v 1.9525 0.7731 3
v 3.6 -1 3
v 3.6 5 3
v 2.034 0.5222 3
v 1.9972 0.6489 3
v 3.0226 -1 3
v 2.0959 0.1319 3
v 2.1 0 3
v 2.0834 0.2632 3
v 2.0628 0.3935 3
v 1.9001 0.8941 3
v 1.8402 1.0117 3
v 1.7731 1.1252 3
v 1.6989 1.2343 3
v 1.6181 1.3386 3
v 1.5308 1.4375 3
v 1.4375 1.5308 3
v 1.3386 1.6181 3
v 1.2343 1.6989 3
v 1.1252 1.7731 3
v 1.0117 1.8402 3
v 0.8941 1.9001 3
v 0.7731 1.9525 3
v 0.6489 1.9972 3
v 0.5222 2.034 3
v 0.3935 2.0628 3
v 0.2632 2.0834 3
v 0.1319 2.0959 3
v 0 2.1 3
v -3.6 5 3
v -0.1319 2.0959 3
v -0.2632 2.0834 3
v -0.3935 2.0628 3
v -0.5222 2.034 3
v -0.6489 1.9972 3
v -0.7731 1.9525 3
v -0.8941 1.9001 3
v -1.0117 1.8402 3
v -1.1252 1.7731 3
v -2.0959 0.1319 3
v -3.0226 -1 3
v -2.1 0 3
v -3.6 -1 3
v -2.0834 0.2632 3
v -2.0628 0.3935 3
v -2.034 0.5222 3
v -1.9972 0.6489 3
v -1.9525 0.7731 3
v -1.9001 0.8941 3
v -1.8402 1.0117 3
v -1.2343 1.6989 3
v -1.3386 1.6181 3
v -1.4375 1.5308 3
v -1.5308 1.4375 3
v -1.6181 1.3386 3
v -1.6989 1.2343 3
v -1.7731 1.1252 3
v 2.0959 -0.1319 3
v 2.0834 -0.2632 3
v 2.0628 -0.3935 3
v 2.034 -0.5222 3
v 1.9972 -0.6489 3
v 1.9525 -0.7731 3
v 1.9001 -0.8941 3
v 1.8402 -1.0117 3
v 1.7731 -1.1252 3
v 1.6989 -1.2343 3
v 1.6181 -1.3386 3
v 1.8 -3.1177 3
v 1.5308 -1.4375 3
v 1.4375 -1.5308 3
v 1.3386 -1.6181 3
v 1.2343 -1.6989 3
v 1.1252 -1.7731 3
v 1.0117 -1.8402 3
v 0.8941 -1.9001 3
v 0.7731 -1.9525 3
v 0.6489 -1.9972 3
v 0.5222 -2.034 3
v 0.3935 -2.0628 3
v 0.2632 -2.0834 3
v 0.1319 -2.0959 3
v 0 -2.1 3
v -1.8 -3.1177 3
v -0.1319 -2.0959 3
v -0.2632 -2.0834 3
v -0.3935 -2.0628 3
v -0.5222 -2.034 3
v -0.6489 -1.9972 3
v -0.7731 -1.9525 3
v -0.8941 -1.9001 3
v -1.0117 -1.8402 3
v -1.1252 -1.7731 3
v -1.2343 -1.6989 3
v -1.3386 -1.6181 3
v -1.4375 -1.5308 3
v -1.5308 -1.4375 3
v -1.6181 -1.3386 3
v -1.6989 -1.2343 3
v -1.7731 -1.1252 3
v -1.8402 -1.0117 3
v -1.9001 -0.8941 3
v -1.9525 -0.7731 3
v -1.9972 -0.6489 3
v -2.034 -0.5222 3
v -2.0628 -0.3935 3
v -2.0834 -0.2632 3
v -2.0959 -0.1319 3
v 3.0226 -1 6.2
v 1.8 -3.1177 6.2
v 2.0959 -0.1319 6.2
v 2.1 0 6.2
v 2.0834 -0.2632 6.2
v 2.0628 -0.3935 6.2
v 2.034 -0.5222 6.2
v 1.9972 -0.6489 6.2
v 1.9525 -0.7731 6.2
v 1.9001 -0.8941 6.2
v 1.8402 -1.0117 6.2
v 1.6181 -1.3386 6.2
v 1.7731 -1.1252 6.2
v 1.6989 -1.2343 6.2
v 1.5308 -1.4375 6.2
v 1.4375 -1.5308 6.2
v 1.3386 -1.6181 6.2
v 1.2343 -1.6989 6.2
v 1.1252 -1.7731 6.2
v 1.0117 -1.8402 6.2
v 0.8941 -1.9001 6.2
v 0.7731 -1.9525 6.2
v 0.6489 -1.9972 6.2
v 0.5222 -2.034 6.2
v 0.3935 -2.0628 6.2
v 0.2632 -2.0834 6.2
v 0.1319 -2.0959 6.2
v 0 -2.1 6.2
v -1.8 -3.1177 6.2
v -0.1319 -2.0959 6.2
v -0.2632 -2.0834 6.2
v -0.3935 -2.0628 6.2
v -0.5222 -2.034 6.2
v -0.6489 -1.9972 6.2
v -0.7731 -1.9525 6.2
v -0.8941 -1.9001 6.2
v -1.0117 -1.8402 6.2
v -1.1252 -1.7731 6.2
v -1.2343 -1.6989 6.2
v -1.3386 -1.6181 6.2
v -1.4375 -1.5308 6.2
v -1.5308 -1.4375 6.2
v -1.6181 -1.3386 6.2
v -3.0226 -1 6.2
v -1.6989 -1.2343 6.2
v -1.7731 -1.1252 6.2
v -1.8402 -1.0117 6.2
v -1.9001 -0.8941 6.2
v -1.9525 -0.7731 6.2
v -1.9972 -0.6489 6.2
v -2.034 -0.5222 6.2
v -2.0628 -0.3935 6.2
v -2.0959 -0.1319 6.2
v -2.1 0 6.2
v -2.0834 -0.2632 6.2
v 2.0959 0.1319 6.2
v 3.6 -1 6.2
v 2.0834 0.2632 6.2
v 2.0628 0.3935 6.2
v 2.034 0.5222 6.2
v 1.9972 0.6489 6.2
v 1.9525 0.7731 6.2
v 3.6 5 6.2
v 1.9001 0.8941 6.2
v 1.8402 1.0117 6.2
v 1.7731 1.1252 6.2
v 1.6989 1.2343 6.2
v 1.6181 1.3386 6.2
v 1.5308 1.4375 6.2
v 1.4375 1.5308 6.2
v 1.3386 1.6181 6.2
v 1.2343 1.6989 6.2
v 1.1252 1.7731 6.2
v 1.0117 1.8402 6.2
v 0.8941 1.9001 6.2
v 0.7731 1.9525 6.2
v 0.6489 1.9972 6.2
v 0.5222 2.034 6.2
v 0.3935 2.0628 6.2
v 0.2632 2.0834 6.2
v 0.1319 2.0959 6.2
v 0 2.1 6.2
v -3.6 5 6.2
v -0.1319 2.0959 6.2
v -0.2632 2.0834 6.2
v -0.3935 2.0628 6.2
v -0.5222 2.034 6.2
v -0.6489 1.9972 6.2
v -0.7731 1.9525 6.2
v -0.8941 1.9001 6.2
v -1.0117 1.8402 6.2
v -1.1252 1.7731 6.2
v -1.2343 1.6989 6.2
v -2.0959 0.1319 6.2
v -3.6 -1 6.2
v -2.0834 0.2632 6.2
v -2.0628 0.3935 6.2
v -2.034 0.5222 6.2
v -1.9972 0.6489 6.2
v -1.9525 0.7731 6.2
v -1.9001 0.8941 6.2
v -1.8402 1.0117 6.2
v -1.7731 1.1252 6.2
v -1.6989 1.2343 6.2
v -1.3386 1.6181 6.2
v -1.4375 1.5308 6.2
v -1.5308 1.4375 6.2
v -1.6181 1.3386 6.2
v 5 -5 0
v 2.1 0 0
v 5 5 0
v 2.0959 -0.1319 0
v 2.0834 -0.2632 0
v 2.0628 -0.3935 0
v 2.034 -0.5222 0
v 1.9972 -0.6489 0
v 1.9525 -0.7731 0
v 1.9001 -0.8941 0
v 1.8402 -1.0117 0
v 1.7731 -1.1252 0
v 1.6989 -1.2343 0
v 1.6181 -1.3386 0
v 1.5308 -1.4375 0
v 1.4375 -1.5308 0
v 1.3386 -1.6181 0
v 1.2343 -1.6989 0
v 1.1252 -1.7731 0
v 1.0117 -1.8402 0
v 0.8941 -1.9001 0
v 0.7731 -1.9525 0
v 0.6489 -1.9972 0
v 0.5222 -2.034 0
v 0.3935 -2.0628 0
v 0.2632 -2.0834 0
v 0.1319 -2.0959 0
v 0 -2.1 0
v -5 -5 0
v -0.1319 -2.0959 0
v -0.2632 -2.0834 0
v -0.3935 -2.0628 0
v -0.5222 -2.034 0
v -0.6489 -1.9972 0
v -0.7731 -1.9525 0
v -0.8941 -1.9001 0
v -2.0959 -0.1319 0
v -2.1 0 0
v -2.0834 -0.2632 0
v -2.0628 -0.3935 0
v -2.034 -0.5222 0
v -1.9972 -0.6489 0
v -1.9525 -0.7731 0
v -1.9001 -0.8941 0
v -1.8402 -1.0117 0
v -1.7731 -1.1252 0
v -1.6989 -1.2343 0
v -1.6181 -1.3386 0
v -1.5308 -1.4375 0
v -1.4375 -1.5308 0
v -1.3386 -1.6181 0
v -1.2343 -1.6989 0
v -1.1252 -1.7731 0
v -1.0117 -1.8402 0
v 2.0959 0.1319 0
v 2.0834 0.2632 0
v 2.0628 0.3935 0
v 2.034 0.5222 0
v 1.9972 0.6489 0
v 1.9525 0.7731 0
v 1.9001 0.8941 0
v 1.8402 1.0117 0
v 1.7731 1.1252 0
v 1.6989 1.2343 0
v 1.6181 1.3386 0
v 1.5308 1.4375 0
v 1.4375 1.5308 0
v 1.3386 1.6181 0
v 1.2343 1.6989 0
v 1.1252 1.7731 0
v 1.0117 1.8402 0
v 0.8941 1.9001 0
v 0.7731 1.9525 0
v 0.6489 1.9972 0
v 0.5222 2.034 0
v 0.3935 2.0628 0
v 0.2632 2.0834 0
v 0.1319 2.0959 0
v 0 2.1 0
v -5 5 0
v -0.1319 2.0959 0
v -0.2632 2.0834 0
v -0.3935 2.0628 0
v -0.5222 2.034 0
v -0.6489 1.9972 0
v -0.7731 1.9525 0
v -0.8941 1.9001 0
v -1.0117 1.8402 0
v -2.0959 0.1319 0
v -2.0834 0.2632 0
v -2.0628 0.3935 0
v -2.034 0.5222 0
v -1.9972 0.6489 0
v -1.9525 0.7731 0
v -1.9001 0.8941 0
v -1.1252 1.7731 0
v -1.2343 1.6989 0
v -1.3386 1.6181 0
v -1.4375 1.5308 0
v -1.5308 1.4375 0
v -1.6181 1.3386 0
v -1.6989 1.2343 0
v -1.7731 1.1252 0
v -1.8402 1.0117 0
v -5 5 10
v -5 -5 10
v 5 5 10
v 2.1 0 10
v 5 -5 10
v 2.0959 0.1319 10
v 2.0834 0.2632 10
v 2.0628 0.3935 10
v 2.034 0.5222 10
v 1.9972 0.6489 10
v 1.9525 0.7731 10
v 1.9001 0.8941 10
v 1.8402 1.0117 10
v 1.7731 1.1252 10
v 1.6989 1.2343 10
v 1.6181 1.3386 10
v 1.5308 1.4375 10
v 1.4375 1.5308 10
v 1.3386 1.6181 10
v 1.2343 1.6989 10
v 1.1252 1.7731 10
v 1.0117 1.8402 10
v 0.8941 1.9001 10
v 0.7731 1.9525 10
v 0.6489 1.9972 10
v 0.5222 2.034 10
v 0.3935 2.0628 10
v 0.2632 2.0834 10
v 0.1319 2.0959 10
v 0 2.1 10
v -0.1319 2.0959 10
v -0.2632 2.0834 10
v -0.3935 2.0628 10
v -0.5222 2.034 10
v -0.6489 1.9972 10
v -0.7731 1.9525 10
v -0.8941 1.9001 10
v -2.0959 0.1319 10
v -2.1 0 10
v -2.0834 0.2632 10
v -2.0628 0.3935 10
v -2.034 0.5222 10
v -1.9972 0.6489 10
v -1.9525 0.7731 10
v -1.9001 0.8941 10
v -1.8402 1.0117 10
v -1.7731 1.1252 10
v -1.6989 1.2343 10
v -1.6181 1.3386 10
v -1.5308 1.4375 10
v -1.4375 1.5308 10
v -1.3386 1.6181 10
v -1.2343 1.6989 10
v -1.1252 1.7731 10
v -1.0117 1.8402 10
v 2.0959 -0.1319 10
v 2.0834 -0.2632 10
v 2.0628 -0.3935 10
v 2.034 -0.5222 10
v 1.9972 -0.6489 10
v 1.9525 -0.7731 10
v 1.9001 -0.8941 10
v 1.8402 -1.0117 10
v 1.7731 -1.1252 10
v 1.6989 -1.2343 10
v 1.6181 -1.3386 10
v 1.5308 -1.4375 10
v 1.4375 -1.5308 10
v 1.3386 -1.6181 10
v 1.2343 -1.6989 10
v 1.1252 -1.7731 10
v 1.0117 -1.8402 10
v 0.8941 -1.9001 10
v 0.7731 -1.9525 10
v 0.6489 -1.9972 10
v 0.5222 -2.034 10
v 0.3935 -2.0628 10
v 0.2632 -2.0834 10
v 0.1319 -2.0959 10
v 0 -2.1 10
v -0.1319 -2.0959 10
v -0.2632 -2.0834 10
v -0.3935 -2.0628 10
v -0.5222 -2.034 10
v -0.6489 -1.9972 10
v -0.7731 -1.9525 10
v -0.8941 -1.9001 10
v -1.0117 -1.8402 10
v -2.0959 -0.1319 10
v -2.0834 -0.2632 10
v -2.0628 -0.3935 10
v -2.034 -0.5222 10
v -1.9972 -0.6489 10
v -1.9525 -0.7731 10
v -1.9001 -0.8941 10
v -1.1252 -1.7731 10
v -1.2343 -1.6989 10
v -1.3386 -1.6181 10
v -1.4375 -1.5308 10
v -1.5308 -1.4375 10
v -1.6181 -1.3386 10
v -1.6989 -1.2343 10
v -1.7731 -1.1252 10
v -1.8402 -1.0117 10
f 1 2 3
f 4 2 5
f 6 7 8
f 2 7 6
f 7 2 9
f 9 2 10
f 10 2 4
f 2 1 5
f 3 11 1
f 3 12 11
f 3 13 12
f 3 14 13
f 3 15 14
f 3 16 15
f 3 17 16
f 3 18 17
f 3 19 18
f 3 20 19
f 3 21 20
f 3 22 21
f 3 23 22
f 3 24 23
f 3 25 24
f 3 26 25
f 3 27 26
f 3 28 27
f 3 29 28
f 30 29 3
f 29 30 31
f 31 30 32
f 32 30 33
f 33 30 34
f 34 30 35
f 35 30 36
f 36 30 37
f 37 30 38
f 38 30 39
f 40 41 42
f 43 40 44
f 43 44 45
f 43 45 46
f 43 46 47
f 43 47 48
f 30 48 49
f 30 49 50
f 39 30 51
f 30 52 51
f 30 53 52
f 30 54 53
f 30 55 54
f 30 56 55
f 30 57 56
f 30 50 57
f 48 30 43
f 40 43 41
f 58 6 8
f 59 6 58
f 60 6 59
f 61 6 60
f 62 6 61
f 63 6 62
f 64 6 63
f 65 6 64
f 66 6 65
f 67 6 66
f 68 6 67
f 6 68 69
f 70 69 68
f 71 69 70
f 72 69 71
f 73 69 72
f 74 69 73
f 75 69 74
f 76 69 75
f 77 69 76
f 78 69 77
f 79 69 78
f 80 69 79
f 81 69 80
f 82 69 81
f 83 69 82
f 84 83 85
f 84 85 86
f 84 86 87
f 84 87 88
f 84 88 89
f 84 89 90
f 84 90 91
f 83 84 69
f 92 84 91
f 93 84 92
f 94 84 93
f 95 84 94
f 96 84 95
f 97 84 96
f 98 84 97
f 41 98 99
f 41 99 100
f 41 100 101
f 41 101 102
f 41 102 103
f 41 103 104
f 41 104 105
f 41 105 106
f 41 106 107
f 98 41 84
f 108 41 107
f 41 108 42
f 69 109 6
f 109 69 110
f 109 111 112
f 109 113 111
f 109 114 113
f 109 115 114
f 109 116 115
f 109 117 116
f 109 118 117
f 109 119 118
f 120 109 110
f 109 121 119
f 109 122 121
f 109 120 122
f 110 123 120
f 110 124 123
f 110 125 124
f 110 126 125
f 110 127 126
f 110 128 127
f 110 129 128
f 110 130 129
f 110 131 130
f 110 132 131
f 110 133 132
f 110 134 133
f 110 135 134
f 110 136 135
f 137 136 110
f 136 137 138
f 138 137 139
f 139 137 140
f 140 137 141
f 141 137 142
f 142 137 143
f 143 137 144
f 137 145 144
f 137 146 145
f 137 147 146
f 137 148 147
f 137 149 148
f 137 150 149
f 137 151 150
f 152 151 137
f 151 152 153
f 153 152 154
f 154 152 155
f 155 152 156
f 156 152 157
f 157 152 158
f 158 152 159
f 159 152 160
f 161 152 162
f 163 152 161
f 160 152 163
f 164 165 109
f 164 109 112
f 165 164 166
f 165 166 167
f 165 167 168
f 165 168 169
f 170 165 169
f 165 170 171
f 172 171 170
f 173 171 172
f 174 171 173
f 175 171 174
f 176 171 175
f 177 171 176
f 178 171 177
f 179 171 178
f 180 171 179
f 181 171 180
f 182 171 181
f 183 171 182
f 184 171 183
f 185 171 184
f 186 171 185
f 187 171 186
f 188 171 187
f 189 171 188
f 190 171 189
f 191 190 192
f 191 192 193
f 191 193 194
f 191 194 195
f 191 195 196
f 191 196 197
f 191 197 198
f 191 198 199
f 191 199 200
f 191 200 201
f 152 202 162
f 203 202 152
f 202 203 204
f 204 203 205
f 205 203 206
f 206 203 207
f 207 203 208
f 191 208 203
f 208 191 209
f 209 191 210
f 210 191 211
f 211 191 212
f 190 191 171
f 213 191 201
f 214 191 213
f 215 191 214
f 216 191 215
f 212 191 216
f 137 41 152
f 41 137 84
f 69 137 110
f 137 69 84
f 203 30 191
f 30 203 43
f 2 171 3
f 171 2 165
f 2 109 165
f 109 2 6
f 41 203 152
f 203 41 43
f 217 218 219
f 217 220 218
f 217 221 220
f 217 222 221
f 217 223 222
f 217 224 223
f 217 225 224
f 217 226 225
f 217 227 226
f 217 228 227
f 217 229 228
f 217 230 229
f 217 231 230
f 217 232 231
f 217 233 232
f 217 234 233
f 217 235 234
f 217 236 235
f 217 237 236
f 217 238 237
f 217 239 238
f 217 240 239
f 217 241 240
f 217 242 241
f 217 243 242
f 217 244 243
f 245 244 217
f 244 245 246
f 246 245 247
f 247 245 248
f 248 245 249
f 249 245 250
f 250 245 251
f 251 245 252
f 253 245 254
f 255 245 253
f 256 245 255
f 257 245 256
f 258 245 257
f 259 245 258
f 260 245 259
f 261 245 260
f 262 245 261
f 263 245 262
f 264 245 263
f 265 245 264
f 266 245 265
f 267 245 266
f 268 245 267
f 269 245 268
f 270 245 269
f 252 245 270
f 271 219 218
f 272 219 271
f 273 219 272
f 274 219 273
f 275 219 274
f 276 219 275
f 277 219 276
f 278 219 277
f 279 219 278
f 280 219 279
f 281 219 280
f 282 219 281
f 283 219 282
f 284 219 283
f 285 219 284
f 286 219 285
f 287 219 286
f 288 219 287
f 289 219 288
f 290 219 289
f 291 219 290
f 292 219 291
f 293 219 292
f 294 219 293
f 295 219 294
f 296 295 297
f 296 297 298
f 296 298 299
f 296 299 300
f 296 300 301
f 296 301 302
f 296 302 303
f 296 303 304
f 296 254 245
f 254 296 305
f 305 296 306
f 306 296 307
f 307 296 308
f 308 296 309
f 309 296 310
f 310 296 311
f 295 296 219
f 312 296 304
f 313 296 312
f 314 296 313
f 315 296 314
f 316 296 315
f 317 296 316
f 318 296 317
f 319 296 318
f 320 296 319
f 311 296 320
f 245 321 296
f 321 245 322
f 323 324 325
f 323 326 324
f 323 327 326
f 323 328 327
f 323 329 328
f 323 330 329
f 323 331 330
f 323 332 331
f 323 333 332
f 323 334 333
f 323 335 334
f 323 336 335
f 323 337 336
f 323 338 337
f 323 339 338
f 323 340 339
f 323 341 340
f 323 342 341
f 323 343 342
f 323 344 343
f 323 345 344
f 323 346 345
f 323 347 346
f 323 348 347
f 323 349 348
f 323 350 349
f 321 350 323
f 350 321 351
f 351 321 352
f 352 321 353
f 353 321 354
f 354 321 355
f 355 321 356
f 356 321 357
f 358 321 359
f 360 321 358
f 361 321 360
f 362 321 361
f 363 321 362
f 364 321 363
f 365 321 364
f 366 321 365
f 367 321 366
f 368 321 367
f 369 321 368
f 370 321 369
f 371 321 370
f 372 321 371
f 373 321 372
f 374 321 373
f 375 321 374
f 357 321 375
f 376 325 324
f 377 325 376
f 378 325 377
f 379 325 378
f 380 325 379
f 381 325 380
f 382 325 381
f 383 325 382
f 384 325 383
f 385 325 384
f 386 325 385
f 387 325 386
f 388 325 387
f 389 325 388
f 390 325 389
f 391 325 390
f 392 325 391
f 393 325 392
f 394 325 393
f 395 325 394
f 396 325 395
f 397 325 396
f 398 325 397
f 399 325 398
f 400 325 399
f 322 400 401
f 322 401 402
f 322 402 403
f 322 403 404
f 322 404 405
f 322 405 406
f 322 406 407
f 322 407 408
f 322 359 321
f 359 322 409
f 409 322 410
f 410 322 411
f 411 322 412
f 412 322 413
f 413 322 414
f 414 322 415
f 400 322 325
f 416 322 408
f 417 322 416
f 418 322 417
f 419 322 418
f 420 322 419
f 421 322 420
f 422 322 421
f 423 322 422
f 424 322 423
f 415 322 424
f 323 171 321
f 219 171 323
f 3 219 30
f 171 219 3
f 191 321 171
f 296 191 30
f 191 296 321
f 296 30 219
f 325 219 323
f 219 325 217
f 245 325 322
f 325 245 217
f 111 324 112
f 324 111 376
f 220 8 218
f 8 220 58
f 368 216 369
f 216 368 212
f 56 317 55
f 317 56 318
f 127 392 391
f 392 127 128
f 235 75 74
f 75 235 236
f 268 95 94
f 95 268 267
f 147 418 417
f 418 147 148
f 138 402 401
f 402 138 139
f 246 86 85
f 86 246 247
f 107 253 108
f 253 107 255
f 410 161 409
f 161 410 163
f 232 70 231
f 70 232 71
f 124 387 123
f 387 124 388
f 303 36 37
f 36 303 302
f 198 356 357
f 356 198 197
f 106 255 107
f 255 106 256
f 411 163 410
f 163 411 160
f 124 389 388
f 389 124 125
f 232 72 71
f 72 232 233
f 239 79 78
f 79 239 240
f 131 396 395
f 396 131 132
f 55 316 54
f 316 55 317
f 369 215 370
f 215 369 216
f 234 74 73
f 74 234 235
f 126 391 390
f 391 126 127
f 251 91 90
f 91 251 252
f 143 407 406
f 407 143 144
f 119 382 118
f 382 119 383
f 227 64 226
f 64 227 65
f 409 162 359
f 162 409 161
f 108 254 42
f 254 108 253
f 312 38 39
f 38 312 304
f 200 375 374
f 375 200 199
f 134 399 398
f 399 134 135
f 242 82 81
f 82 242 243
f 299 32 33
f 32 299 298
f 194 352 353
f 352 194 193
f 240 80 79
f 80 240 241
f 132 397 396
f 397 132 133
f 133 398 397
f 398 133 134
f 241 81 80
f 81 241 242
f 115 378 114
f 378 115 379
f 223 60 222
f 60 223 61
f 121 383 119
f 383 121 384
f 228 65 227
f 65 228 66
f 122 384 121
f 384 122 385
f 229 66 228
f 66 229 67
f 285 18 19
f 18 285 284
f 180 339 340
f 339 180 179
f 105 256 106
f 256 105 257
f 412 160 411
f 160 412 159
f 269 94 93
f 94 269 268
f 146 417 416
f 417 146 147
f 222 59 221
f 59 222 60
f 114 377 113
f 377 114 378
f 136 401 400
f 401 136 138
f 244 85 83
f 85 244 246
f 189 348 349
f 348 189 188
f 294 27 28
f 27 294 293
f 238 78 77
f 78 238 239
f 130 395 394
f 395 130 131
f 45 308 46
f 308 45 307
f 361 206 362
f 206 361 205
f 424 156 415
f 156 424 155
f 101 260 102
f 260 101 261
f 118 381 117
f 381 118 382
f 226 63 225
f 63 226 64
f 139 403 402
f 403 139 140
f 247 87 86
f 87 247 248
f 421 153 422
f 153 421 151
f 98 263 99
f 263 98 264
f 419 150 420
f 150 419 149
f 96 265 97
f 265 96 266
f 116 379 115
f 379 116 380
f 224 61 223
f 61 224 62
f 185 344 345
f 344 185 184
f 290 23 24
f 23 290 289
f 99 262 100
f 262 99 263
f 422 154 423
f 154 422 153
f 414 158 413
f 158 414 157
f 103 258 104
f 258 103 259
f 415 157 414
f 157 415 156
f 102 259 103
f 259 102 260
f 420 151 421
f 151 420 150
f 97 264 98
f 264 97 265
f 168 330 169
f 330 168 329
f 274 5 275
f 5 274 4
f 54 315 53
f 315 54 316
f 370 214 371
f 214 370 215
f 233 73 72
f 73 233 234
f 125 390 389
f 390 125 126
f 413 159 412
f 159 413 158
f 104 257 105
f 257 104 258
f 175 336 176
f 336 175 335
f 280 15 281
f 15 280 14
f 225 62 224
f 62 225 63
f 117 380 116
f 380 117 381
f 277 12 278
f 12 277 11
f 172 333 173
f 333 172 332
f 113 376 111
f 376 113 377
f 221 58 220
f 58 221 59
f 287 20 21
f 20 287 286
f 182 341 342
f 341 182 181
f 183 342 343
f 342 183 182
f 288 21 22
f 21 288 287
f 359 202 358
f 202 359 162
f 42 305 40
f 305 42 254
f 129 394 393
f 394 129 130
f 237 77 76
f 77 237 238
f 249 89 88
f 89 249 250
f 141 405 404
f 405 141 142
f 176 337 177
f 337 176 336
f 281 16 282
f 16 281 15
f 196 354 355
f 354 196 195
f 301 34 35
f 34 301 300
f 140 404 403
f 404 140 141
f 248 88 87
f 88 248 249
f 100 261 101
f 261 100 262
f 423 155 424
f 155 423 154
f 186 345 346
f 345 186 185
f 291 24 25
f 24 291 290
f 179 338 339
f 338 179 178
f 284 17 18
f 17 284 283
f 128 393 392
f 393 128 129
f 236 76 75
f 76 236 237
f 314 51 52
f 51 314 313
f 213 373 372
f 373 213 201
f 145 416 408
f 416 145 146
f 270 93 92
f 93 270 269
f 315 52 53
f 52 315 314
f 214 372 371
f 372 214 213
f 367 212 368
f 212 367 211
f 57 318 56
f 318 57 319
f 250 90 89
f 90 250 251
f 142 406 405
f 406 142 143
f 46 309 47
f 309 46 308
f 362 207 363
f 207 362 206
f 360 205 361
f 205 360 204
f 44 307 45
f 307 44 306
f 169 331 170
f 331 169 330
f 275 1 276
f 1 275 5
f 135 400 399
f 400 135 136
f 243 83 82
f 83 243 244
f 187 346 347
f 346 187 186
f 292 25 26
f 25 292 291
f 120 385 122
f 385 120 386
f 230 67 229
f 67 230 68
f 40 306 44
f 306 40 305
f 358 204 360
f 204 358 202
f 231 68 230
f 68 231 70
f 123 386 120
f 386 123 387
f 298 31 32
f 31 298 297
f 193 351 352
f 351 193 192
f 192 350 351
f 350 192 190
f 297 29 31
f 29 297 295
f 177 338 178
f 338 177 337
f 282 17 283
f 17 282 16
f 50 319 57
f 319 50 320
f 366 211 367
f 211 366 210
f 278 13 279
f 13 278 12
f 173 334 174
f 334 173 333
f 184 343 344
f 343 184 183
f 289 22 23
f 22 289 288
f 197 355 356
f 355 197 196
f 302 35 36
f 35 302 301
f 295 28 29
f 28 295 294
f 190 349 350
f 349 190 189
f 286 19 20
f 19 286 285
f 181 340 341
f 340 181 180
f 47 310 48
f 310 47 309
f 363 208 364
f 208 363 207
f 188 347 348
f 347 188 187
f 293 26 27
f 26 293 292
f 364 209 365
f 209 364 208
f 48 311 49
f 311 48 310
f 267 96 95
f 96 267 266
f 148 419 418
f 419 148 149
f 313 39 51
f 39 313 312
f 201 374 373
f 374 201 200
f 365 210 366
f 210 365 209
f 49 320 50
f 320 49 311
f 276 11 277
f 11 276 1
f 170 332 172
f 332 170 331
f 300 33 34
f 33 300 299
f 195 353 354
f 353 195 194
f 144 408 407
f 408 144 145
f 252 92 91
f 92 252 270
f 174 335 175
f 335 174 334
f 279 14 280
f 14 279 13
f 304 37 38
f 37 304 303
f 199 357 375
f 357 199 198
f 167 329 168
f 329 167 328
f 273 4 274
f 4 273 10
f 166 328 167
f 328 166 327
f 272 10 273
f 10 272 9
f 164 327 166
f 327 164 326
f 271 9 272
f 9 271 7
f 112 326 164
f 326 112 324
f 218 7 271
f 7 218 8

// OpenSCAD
// file: config.scad
HEX_WIDTH= 125;
HEX_BORDER = 7;
HEX_HEIGHT = 20;
HEX_ARM = HEX_WIDTH / 6;
SHIELD_THICKNESS = 2;

SNAPFIT_DEPTH = 12.5;
SNAPFIT_HEIGHT = 7.5;
// main file
include <config.scad>

difference() {
    $fn = 100;
    linear_extrude(10)
    square([ 10, 10 ], center=true);
    linear_extrude(10)
    circle(d=4.2);


    translate([0, 0, 3])
    union() {
        $fn = 6;
        linear_extrude(3.2)
        circle(d=7.2);

        translate([0, 5, 0])
        linear_extrude(3.2)
        square([7.2, 12], center=true);
    }  
}
